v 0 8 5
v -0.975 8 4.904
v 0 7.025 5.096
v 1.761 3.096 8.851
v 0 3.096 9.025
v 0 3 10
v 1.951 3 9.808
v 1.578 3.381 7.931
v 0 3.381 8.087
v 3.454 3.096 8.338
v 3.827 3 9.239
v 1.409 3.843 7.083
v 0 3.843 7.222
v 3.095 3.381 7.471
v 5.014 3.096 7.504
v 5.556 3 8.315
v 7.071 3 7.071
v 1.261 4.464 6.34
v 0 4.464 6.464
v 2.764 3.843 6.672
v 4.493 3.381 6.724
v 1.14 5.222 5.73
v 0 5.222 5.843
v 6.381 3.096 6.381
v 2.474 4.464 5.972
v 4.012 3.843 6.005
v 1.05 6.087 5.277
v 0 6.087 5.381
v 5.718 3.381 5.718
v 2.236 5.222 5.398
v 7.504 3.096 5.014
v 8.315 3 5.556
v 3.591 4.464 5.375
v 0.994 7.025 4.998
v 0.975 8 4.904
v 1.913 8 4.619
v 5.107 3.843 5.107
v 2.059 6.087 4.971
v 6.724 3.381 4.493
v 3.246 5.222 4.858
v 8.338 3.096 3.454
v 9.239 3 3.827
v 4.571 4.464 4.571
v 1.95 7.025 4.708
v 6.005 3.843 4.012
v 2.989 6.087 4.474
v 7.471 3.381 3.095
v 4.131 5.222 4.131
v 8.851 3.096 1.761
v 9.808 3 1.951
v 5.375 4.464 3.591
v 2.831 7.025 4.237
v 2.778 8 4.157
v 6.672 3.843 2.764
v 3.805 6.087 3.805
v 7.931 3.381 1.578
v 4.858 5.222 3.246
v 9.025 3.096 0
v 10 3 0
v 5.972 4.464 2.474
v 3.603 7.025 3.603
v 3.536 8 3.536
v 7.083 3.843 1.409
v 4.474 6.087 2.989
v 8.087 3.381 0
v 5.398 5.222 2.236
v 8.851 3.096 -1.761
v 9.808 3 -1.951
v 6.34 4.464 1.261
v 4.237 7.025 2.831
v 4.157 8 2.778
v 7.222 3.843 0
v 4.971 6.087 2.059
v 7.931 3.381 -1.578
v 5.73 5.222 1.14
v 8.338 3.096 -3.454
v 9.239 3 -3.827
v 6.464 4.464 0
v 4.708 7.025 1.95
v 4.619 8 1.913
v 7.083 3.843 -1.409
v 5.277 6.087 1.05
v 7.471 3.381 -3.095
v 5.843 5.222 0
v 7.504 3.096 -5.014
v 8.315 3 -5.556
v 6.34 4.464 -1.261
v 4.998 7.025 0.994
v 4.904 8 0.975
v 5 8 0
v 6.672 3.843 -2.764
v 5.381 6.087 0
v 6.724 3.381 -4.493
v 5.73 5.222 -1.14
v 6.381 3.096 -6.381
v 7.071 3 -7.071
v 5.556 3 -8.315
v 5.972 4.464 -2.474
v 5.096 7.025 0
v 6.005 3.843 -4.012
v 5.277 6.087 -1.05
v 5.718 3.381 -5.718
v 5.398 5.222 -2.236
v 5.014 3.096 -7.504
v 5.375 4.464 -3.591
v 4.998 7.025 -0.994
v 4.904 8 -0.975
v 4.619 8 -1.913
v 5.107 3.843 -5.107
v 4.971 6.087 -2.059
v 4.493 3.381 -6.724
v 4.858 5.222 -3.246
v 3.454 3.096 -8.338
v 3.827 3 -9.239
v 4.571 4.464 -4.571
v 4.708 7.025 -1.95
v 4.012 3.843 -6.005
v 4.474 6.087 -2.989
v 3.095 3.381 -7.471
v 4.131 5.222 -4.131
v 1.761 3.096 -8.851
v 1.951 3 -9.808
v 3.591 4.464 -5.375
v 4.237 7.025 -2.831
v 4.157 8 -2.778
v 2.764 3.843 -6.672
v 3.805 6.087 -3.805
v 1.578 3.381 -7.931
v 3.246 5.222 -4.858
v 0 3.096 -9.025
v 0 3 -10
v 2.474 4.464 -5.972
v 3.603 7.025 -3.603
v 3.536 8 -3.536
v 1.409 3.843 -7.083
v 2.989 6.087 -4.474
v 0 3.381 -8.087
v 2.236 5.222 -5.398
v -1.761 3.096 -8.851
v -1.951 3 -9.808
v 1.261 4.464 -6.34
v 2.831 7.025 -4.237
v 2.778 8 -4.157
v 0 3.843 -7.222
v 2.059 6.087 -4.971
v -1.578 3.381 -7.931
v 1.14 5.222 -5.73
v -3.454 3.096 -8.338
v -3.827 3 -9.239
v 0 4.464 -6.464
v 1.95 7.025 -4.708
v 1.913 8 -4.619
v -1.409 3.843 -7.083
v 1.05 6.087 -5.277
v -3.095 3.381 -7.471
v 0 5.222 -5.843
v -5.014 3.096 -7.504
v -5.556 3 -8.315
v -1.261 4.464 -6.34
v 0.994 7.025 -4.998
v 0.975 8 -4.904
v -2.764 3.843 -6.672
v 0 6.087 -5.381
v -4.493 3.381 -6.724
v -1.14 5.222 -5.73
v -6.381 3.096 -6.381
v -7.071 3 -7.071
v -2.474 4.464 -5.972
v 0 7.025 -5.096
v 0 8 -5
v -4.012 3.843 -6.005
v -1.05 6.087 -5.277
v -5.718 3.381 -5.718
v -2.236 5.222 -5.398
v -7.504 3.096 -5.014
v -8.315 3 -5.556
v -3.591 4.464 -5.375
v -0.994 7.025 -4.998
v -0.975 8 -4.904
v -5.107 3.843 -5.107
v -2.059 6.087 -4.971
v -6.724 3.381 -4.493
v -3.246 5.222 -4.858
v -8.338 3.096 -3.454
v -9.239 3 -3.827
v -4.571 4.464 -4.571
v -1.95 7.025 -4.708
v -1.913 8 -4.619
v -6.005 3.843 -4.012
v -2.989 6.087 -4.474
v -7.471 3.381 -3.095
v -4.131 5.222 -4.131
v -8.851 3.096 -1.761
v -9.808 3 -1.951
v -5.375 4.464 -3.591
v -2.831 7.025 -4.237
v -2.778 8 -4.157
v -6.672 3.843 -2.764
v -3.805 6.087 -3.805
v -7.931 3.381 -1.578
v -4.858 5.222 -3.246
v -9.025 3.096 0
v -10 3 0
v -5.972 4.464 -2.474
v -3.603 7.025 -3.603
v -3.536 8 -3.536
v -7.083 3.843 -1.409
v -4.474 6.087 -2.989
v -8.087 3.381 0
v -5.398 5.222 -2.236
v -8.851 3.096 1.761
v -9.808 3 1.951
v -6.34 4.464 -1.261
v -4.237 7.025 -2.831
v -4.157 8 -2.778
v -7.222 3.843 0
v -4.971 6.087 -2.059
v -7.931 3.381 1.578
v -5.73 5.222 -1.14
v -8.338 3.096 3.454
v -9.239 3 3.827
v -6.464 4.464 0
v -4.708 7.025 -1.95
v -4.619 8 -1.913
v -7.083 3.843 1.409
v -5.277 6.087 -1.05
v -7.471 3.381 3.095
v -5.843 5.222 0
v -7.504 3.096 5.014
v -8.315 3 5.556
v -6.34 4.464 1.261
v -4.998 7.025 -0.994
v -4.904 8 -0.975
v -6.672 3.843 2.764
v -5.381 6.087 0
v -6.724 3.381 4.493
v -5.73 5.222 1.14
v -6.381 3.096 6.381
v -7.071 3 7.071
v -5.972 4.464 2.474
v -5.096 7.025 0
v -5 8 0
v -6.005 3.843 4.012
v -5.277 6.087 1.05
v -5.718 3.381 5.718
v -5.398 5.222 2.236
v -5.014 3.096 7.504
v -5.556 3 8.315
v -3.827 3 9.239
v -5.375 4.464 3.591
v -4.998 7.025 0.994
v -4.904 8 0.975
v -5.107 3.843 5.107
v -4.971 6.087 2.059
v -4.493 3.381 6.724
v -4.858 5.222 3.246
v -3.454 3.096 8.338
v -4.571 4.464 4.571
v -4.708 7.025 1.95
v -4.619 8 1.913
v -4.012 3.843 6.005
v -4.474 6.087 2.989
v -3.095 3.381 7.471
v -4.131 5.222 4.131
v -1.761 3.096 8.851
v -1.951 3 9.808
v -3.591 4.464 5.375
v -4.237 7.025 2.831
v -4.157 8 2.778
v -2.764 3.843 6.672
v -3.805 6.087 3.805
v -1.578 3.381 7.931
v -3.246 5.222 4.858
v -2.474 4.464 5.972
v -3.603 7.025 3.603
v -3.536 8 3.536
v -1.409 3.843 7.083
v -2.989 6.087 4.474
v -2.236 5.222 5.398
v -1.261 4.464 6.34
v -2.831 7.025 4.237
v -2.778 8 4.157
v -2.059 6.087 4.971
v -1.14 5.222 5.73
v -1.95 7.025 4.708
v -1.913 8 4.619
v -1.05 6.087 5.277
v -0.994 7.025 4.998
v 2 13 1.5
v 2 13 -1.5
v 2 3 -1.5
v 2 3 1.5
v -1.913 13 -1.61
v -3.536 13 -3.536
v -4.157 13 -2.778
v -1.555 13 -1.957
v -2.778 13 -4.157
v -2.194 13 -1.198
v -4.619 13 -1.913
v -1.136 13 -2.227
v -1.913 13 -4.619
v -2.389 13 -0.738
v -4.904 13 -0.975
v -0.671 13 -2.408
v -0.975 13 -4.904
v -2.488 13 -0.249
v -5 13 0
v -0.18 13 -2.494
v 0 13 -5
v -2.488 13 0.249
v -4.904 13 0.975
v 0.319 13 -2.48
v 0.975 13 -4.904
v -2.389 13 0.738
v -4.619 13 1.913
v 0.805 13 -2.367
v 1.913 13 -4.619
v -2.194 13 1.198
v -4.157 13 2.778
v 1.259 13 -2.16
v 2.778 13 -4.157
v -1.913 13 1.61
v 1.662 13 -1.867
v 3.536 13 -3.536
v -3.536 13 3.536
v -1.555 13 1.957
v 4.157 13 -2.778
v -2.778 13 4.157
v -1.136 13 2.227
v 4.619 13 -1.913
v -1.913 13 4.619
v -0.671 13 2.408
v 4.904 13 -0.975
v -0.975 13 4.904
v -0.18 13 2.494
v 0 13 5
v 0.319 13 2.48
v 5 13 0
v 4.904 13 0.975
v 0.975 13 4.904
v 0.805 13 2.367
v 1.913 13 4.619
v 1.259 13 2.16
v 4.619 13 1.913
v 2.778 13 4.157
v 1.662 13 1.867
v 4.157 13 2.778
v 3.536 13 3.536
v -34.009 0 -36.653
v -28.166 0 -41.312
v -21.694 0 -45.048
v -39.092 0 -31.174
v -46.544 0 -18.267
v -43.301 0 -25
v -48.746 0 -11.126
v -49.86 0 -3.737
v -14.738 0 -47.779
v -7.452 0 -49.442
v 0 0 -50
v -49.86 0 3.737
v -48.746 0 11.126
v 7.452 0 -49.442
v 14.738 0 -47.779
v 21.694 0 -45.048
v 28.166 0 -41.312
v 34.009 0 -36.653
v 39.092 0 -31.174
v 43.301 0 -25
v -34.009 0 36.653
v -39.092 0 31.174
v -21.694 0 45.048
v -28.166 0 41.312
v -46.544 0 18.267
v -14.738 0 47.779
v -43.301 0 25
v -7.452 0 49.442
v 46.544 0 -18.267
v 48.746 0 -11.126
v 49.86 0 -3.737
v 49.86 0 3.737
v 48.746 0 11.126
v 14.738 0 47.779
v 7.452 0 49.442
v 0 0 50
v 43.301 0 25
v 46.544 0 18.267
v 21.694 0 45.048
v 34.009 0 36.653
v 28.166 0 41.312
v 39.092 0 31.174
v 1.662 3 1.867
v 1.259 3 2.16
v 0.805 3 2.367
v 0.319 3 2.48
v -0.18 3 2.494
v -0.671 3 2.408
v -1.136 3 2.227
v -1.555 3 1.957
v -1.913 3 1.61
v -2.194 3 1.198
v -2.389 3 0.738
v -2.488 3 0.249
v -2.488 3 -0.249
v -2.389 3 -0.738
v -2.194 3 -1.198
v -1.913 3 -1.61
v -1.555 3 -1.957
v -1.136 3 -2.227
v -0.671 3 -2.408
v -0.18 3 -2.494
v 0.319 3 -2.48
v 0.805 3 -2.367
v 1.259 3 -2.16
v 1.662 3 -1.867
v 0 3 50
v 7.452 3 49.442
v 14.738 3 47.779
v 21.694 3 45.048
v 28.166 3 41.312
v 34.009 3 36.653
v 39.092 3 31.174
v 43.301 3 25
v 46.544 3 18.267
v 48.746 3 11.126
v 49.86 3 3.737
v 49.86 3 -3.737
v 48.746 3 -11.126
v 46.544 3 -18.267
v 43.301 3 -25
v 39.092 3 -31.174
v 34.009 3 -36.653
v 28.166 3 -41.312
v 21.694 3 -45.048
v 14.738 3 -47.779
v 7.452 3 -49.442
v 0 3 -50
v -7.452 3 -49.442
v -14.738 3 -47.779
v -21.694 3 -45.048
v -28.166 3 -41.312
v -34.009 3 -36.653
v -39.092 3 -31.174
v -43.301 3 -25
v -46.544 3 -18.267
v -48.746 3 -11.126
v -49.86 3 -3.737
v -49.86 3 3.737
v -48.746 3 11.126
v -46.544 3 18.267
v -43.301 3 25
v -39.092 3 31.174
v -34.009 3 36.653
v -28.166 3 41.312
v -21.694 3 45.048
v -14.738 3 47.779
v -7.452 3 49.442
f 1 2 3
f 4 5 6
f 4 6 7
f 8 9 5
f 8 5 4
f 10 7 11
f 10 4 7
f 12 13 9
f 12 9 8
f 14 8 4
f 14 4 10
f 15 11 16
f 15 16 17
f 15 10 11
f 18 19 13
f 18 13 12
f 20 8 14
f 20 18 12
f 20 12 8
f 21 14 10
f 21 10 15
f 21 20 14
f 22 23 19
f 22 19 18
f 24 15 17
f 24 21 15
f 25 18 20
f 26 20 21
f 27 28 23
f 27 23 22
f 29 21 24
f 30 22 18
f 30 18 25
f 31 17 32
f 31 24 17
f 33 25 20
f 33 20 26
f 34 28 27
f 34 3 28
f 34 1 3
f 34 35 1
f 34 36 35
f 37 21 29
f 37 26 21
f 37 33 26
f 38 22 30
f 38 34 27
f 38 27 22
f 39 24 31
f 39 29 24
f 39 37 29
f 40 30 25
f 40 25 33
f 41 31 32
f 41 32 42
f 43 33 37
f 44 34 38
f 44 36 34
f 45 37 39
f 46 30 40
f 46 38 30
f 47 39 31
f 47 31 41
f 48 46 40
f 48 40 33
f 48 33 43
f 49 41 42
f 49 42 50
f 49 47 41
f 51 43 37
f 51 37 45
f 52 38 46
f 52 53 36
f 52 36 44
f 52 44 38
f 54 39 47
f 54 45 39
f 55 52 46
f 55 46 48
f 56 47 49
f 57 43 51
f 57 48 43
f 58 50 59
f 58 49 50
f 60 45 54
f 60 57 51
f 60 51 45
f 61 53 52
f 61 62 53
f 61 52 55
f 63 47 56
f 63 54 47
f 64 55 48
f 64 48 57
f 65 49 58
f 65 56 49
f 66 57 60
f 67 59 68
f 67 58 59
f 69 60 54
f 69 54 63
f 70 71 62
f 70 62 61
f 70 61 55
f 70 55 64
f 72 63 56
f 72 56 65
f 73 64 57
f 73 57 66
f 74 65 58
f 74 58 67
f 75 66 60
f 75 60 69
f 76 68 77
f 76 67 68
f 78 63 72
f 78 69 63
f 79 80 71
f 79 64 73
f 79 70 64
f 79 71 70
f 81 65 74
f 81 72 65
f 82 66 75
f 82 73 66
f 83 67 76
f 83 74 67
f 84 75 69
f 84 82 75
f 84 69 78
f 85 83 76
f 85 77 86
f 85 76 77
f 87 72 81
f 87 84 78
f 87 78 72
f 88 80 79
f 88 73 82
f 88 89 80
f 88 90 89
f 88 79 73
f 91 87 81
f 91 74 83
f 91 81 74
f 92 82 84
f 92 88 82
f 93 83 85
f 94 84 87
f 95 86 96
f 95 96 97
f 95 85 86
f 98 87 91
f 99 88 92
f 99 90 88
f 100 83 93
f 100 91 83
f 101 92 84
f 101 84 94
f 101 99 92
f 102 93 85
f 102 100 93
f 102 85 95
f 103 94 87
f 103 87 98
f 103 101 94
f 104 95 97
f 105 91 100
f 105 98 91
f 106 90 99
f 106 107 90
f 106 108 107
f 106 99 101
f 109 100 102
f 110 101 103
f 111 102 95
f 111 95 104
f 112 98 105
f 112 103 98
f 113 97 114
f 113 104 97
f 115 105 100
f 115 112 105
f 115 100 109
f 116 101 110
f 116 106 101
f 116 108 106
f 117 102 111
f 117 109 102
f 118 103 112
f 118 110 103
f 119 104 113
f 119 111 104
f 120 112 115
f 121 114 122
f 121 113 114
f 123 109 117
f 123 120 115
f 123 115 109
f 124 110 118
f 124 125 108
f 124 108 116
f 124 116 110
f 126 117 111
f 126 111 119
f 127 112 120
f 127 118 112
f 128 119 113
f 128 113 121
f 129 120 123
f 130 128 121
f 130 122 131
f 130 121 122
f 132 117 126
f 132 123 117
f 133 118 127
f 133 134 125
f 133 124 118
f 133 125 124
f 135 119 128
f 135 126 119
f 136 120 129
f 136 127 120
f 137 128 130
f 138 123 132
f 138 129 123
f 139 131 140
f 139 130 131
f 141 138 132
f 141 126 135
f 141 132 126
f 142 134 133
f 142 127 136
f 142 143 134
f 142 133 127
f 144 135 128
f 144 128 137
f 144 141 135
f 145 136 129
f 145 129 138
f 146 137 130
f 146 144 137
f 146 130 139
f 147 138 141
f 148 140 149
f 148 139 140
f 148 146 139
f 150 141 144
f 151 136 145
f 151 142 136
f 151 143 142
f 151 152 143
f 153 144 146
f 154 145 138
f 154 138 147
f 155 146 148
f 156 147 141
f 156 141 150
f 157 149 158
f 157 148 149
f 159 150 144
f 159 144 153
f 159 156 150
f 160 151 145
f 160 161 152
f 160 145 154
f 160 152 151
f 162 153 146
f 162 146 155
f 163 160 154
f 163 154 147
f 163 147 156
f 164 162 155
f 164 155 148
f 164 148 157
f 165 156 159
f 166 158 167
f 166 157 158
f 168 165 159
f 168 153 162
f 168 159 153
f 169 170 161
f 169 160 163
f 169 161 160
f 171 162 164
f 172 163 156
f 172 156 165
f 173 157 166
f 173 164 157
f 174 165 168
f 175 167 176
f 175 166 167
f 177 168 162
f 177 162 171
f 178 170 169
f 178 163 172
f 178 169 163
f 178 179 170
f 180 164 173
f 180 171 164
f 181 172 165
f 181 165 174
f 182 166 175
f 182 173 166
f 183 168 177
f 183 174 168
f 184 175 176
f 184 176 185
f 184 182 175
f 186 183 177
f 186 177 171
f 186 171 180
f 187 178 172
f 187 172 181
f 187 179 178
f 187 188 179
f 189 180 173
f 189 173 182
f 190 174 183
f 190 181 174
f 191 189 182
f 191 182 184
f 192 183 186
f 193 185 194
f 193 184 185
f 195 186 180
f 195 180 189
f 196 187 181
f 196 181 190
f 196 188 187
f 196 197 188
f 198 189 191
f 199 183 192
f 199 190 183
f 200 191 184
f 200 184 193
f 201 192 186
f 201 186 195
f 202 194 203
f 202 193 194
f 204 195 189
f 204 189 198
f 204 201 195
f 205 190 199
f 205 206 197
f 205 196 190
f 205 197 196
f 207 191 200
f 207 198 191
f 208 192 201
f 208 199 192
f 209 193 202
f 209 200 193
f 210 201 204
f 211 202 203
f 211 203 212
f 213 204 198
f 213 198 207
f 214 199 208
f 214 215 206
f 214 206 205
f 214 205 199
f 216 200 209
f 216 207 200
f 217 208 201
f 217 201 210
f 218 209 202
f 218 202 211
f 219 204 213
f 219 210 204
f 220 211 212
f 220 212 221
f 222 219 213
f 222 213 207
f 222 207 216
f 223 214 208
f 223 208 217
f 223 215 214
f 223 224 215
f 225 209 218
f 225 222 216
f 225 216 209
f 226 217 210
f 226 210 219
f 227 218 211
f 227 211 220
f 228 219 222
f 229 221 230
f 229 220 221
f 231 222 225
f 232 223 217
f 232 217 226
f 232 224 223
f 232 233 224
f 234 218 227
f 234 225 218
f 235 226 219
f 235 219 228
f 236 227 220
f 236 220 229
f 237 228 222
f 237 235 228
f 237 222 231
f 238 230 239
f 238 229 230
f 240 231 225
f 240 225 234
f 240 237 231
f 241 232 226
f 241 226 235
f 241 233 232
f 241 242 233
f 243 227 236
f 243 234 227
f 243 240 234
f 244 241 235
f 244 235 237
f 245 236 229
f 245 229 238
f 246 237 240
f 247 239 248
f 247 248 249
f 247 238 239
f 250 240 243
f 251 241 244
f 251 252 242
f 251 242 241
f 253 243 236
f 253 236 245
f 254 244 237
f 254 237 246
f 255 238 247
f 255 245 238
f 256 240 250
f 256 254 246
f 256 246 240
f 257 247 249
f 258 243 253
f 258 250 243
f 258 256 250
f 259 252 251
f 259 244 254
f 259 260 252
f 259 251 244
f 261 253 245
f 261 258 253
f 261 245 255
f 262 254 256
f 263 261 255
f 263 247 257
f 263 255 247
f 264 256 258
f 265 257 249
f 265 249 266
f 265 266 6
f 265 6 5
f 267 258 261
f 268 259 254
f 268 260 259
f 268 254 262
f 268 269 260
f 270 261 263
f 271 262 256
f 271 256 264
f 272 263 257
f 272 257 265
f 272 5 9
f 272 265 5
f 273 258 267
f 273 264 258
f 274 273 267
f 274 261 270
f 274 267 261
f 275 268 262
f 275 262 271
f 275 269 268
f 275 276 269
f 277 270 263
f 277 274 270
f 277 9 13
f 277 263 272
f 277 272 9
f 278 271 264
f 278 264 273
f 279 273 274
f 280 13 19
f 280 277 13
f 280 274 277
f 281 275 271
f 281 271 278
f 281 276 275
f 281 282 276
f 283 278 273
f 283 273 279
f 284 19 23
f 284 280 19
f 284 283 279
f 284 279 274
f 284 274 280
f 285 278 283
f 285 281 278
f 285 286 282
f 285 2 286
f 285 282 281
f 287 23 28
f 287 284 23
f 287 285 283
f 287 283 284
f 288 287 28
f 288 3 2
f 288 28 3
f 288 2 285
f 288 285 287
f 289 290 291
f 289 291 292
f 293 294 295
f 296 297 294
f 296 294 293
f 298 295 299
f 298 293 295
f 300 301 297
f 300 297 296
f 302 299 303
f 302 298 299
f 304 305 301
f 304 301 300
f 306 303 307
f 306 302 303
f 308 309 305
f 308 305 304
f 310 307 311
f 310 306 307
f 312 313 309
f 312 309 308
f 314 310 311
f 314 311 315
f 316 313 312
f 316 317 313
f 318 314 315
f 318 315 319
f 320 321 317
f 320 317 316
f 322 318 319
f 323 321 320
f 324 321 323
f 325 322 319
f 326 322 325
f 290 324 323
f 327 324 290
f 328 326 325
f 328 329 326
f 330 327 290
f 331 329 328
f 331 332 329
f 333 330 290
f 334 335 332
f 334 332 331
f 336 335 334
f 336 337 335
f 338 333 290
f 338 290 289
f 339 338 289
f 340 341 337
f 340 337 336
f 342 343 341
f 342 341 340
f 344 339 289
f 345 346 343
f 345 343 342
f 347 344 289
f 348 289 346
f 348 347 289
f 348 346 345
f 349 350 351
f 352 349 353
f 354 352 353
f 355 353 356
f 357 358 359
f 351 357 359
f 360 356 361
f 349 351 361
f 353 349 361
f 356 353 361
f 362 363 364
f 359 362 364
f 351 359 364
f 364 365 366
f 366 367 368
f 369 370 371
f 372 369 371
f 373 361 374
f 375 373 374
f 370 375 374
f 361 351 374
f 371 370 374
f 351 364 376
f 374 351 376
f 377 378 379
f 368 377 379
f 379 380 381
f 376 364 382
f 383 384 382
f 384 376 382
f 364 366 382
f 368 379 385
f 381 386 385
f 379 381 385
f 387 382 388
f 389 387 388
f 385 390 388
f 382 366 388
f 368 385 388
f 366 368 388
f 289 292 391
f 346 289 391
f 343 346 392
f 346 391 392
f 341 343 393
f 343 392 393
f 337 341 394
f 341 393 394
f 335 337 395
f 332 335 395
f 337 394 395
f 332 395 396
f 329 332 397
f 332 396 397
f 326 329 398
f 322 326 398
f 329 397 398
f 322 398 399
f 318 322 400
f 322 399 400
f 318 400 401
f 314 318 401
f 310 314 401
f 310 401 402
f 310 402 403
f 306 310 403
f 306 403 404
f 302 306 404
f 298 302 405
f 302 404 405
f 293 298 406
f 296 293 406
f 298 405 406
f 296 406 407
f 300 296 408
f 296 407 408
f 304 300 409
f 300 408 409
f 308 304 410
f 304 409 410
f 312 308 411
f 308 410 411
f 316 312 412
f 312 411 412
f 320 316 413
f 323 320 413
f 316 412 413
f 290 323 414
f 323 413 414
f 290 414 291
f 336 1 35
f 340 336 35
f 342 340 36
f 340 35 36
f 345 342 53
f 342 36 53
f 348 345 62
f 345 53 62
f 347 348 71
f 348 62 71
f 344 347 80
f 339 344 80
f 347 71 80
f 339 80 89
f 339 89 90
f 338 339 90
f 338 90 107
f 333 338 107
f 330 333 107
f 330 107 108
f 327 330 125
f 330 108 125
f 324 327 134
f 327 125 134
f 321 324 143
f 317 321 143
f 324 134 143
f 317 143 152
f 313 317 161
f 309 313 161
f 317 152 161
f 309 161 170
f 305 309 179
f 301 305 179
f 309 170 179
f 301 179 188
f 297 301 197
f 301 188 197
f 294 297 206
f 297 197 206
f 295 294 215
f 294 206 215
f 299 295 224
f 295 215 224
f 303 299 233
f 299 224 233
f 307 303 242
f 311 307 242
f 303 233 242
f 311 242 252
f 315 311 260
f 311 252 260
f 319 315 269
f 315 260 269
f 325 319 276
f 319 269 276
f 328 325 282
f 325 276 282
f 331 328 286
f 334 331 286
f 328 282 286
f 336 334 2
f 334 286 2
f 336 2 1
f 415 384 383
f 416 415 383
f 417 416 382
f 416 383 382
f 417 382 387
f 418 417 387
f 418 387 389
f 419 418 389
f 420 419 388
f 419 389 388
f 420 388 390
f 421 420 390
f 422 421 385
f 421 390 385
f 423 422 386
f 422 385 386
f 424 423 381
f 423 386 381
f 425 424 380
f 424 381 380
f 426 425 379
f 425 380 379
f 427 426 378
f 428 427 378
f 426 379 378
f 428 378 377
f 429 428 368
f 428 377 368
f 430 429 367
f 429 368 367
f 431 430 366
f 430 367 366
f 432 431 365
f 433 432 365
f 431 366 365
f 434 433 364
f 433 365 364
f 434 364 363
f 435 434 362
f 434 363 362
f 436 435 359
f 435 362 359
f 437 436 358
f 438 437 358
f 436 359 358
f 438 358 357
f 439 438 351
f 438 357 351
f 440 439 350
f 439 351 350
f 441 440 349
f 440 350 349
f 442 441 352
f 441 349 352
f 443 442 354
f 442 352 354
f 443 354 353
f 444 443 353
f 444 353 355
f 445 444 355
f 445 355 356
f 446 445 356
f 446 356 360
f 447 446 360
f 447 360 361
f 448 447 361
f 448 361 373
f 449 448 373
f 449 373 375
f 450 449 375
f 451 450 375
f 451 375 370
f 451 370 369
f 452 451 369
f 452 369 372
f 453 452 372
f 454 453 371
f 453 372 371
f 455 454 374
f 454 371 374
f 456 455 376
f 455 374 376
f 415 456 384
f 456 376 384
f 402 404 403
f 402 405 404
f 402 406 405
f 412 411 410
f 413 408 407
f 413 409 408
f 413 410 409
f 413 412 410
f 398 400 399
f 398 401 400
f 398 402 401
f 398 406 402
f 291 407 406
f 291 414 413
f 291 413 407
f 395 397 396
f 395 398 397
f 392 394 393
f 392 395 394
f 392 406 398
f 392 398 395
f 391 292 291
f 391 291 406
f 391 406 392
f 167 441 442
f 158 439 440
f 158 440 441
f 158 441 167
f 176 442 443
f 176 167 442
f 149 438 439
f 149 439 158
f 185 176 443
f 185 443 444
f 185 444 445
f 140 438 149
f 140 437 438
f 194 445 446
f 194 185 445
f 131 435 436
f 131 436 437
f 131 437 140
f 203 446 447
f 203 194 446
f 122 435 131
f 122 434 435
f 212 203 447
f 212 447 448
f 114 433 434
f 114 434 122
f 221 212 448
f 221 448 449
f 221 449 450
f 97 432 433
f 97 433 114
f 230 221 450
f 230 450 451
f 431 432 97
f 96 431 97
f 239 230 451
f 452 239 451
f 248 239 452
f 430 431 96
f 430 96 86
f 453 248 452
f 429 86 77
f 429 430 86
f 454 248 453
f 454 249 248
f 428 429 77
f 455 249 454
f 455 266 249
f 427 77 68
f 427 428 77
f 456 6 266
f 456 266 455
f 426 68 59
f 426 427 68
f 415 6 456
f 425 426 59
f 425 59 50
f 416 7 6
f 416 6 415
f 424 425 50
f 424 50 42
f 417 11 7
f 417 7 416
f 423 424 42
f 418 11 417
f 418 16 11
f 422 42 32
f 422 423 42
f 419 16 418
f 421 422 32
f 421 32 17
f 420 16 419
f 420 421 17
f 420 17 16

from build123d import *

# Parameters (mm, degrees)
SKETCH2_R           = 50
BOSS_EXTRUDE1_DEPTH = 3
SKETCH3_R           = 5
BOSS_EXTRUDE2_DEPTH = 10
FILLET1_R           = 5


with BuildPart() as part:
    # Sketch2 → Boss-Extrude1 (new body)
    with BuildSketch(Plane(origin=(0, 0, 0), x_dir=(1, 0, 0), z_dir=(0, 1, 0))):
        with Locations(Location((0, 0, 0), (0, 0, 270))):
            Circle(SKETCH2_R)
    extrude(amount=BOSS_EXTRUDE1_DEPTH)

    # Sketch3 → Boss-Extrude2 (add)
    with BuildSketch(Plane(origin=(0, 3, 0), x_dir=(1, 0, 0), z_dir=(0, 1, 0))):
        with Locations(Location((0, 0, 0), (0, 0, 270))):
            Circle(SKETCH3_R)
        with BuildLine():
            Line((2, 1.5), (2, -1.5))
            ThreePointArc((2, -1.5), (-2.5, 0), (2, 1.5))
        make_face(mode=Mode.SUBTRACT)
    extrude(amount=BOSS_EXTRUDE2_DEPTH)

    # Fillet1
    fillet1_edges = [part.edges().sort_by_distance(p)[0] for p in [
        (0, 3, -5),
    ]]
    fillet(fillet1_edges, radius=FILLET1_R)


solid = part.part
